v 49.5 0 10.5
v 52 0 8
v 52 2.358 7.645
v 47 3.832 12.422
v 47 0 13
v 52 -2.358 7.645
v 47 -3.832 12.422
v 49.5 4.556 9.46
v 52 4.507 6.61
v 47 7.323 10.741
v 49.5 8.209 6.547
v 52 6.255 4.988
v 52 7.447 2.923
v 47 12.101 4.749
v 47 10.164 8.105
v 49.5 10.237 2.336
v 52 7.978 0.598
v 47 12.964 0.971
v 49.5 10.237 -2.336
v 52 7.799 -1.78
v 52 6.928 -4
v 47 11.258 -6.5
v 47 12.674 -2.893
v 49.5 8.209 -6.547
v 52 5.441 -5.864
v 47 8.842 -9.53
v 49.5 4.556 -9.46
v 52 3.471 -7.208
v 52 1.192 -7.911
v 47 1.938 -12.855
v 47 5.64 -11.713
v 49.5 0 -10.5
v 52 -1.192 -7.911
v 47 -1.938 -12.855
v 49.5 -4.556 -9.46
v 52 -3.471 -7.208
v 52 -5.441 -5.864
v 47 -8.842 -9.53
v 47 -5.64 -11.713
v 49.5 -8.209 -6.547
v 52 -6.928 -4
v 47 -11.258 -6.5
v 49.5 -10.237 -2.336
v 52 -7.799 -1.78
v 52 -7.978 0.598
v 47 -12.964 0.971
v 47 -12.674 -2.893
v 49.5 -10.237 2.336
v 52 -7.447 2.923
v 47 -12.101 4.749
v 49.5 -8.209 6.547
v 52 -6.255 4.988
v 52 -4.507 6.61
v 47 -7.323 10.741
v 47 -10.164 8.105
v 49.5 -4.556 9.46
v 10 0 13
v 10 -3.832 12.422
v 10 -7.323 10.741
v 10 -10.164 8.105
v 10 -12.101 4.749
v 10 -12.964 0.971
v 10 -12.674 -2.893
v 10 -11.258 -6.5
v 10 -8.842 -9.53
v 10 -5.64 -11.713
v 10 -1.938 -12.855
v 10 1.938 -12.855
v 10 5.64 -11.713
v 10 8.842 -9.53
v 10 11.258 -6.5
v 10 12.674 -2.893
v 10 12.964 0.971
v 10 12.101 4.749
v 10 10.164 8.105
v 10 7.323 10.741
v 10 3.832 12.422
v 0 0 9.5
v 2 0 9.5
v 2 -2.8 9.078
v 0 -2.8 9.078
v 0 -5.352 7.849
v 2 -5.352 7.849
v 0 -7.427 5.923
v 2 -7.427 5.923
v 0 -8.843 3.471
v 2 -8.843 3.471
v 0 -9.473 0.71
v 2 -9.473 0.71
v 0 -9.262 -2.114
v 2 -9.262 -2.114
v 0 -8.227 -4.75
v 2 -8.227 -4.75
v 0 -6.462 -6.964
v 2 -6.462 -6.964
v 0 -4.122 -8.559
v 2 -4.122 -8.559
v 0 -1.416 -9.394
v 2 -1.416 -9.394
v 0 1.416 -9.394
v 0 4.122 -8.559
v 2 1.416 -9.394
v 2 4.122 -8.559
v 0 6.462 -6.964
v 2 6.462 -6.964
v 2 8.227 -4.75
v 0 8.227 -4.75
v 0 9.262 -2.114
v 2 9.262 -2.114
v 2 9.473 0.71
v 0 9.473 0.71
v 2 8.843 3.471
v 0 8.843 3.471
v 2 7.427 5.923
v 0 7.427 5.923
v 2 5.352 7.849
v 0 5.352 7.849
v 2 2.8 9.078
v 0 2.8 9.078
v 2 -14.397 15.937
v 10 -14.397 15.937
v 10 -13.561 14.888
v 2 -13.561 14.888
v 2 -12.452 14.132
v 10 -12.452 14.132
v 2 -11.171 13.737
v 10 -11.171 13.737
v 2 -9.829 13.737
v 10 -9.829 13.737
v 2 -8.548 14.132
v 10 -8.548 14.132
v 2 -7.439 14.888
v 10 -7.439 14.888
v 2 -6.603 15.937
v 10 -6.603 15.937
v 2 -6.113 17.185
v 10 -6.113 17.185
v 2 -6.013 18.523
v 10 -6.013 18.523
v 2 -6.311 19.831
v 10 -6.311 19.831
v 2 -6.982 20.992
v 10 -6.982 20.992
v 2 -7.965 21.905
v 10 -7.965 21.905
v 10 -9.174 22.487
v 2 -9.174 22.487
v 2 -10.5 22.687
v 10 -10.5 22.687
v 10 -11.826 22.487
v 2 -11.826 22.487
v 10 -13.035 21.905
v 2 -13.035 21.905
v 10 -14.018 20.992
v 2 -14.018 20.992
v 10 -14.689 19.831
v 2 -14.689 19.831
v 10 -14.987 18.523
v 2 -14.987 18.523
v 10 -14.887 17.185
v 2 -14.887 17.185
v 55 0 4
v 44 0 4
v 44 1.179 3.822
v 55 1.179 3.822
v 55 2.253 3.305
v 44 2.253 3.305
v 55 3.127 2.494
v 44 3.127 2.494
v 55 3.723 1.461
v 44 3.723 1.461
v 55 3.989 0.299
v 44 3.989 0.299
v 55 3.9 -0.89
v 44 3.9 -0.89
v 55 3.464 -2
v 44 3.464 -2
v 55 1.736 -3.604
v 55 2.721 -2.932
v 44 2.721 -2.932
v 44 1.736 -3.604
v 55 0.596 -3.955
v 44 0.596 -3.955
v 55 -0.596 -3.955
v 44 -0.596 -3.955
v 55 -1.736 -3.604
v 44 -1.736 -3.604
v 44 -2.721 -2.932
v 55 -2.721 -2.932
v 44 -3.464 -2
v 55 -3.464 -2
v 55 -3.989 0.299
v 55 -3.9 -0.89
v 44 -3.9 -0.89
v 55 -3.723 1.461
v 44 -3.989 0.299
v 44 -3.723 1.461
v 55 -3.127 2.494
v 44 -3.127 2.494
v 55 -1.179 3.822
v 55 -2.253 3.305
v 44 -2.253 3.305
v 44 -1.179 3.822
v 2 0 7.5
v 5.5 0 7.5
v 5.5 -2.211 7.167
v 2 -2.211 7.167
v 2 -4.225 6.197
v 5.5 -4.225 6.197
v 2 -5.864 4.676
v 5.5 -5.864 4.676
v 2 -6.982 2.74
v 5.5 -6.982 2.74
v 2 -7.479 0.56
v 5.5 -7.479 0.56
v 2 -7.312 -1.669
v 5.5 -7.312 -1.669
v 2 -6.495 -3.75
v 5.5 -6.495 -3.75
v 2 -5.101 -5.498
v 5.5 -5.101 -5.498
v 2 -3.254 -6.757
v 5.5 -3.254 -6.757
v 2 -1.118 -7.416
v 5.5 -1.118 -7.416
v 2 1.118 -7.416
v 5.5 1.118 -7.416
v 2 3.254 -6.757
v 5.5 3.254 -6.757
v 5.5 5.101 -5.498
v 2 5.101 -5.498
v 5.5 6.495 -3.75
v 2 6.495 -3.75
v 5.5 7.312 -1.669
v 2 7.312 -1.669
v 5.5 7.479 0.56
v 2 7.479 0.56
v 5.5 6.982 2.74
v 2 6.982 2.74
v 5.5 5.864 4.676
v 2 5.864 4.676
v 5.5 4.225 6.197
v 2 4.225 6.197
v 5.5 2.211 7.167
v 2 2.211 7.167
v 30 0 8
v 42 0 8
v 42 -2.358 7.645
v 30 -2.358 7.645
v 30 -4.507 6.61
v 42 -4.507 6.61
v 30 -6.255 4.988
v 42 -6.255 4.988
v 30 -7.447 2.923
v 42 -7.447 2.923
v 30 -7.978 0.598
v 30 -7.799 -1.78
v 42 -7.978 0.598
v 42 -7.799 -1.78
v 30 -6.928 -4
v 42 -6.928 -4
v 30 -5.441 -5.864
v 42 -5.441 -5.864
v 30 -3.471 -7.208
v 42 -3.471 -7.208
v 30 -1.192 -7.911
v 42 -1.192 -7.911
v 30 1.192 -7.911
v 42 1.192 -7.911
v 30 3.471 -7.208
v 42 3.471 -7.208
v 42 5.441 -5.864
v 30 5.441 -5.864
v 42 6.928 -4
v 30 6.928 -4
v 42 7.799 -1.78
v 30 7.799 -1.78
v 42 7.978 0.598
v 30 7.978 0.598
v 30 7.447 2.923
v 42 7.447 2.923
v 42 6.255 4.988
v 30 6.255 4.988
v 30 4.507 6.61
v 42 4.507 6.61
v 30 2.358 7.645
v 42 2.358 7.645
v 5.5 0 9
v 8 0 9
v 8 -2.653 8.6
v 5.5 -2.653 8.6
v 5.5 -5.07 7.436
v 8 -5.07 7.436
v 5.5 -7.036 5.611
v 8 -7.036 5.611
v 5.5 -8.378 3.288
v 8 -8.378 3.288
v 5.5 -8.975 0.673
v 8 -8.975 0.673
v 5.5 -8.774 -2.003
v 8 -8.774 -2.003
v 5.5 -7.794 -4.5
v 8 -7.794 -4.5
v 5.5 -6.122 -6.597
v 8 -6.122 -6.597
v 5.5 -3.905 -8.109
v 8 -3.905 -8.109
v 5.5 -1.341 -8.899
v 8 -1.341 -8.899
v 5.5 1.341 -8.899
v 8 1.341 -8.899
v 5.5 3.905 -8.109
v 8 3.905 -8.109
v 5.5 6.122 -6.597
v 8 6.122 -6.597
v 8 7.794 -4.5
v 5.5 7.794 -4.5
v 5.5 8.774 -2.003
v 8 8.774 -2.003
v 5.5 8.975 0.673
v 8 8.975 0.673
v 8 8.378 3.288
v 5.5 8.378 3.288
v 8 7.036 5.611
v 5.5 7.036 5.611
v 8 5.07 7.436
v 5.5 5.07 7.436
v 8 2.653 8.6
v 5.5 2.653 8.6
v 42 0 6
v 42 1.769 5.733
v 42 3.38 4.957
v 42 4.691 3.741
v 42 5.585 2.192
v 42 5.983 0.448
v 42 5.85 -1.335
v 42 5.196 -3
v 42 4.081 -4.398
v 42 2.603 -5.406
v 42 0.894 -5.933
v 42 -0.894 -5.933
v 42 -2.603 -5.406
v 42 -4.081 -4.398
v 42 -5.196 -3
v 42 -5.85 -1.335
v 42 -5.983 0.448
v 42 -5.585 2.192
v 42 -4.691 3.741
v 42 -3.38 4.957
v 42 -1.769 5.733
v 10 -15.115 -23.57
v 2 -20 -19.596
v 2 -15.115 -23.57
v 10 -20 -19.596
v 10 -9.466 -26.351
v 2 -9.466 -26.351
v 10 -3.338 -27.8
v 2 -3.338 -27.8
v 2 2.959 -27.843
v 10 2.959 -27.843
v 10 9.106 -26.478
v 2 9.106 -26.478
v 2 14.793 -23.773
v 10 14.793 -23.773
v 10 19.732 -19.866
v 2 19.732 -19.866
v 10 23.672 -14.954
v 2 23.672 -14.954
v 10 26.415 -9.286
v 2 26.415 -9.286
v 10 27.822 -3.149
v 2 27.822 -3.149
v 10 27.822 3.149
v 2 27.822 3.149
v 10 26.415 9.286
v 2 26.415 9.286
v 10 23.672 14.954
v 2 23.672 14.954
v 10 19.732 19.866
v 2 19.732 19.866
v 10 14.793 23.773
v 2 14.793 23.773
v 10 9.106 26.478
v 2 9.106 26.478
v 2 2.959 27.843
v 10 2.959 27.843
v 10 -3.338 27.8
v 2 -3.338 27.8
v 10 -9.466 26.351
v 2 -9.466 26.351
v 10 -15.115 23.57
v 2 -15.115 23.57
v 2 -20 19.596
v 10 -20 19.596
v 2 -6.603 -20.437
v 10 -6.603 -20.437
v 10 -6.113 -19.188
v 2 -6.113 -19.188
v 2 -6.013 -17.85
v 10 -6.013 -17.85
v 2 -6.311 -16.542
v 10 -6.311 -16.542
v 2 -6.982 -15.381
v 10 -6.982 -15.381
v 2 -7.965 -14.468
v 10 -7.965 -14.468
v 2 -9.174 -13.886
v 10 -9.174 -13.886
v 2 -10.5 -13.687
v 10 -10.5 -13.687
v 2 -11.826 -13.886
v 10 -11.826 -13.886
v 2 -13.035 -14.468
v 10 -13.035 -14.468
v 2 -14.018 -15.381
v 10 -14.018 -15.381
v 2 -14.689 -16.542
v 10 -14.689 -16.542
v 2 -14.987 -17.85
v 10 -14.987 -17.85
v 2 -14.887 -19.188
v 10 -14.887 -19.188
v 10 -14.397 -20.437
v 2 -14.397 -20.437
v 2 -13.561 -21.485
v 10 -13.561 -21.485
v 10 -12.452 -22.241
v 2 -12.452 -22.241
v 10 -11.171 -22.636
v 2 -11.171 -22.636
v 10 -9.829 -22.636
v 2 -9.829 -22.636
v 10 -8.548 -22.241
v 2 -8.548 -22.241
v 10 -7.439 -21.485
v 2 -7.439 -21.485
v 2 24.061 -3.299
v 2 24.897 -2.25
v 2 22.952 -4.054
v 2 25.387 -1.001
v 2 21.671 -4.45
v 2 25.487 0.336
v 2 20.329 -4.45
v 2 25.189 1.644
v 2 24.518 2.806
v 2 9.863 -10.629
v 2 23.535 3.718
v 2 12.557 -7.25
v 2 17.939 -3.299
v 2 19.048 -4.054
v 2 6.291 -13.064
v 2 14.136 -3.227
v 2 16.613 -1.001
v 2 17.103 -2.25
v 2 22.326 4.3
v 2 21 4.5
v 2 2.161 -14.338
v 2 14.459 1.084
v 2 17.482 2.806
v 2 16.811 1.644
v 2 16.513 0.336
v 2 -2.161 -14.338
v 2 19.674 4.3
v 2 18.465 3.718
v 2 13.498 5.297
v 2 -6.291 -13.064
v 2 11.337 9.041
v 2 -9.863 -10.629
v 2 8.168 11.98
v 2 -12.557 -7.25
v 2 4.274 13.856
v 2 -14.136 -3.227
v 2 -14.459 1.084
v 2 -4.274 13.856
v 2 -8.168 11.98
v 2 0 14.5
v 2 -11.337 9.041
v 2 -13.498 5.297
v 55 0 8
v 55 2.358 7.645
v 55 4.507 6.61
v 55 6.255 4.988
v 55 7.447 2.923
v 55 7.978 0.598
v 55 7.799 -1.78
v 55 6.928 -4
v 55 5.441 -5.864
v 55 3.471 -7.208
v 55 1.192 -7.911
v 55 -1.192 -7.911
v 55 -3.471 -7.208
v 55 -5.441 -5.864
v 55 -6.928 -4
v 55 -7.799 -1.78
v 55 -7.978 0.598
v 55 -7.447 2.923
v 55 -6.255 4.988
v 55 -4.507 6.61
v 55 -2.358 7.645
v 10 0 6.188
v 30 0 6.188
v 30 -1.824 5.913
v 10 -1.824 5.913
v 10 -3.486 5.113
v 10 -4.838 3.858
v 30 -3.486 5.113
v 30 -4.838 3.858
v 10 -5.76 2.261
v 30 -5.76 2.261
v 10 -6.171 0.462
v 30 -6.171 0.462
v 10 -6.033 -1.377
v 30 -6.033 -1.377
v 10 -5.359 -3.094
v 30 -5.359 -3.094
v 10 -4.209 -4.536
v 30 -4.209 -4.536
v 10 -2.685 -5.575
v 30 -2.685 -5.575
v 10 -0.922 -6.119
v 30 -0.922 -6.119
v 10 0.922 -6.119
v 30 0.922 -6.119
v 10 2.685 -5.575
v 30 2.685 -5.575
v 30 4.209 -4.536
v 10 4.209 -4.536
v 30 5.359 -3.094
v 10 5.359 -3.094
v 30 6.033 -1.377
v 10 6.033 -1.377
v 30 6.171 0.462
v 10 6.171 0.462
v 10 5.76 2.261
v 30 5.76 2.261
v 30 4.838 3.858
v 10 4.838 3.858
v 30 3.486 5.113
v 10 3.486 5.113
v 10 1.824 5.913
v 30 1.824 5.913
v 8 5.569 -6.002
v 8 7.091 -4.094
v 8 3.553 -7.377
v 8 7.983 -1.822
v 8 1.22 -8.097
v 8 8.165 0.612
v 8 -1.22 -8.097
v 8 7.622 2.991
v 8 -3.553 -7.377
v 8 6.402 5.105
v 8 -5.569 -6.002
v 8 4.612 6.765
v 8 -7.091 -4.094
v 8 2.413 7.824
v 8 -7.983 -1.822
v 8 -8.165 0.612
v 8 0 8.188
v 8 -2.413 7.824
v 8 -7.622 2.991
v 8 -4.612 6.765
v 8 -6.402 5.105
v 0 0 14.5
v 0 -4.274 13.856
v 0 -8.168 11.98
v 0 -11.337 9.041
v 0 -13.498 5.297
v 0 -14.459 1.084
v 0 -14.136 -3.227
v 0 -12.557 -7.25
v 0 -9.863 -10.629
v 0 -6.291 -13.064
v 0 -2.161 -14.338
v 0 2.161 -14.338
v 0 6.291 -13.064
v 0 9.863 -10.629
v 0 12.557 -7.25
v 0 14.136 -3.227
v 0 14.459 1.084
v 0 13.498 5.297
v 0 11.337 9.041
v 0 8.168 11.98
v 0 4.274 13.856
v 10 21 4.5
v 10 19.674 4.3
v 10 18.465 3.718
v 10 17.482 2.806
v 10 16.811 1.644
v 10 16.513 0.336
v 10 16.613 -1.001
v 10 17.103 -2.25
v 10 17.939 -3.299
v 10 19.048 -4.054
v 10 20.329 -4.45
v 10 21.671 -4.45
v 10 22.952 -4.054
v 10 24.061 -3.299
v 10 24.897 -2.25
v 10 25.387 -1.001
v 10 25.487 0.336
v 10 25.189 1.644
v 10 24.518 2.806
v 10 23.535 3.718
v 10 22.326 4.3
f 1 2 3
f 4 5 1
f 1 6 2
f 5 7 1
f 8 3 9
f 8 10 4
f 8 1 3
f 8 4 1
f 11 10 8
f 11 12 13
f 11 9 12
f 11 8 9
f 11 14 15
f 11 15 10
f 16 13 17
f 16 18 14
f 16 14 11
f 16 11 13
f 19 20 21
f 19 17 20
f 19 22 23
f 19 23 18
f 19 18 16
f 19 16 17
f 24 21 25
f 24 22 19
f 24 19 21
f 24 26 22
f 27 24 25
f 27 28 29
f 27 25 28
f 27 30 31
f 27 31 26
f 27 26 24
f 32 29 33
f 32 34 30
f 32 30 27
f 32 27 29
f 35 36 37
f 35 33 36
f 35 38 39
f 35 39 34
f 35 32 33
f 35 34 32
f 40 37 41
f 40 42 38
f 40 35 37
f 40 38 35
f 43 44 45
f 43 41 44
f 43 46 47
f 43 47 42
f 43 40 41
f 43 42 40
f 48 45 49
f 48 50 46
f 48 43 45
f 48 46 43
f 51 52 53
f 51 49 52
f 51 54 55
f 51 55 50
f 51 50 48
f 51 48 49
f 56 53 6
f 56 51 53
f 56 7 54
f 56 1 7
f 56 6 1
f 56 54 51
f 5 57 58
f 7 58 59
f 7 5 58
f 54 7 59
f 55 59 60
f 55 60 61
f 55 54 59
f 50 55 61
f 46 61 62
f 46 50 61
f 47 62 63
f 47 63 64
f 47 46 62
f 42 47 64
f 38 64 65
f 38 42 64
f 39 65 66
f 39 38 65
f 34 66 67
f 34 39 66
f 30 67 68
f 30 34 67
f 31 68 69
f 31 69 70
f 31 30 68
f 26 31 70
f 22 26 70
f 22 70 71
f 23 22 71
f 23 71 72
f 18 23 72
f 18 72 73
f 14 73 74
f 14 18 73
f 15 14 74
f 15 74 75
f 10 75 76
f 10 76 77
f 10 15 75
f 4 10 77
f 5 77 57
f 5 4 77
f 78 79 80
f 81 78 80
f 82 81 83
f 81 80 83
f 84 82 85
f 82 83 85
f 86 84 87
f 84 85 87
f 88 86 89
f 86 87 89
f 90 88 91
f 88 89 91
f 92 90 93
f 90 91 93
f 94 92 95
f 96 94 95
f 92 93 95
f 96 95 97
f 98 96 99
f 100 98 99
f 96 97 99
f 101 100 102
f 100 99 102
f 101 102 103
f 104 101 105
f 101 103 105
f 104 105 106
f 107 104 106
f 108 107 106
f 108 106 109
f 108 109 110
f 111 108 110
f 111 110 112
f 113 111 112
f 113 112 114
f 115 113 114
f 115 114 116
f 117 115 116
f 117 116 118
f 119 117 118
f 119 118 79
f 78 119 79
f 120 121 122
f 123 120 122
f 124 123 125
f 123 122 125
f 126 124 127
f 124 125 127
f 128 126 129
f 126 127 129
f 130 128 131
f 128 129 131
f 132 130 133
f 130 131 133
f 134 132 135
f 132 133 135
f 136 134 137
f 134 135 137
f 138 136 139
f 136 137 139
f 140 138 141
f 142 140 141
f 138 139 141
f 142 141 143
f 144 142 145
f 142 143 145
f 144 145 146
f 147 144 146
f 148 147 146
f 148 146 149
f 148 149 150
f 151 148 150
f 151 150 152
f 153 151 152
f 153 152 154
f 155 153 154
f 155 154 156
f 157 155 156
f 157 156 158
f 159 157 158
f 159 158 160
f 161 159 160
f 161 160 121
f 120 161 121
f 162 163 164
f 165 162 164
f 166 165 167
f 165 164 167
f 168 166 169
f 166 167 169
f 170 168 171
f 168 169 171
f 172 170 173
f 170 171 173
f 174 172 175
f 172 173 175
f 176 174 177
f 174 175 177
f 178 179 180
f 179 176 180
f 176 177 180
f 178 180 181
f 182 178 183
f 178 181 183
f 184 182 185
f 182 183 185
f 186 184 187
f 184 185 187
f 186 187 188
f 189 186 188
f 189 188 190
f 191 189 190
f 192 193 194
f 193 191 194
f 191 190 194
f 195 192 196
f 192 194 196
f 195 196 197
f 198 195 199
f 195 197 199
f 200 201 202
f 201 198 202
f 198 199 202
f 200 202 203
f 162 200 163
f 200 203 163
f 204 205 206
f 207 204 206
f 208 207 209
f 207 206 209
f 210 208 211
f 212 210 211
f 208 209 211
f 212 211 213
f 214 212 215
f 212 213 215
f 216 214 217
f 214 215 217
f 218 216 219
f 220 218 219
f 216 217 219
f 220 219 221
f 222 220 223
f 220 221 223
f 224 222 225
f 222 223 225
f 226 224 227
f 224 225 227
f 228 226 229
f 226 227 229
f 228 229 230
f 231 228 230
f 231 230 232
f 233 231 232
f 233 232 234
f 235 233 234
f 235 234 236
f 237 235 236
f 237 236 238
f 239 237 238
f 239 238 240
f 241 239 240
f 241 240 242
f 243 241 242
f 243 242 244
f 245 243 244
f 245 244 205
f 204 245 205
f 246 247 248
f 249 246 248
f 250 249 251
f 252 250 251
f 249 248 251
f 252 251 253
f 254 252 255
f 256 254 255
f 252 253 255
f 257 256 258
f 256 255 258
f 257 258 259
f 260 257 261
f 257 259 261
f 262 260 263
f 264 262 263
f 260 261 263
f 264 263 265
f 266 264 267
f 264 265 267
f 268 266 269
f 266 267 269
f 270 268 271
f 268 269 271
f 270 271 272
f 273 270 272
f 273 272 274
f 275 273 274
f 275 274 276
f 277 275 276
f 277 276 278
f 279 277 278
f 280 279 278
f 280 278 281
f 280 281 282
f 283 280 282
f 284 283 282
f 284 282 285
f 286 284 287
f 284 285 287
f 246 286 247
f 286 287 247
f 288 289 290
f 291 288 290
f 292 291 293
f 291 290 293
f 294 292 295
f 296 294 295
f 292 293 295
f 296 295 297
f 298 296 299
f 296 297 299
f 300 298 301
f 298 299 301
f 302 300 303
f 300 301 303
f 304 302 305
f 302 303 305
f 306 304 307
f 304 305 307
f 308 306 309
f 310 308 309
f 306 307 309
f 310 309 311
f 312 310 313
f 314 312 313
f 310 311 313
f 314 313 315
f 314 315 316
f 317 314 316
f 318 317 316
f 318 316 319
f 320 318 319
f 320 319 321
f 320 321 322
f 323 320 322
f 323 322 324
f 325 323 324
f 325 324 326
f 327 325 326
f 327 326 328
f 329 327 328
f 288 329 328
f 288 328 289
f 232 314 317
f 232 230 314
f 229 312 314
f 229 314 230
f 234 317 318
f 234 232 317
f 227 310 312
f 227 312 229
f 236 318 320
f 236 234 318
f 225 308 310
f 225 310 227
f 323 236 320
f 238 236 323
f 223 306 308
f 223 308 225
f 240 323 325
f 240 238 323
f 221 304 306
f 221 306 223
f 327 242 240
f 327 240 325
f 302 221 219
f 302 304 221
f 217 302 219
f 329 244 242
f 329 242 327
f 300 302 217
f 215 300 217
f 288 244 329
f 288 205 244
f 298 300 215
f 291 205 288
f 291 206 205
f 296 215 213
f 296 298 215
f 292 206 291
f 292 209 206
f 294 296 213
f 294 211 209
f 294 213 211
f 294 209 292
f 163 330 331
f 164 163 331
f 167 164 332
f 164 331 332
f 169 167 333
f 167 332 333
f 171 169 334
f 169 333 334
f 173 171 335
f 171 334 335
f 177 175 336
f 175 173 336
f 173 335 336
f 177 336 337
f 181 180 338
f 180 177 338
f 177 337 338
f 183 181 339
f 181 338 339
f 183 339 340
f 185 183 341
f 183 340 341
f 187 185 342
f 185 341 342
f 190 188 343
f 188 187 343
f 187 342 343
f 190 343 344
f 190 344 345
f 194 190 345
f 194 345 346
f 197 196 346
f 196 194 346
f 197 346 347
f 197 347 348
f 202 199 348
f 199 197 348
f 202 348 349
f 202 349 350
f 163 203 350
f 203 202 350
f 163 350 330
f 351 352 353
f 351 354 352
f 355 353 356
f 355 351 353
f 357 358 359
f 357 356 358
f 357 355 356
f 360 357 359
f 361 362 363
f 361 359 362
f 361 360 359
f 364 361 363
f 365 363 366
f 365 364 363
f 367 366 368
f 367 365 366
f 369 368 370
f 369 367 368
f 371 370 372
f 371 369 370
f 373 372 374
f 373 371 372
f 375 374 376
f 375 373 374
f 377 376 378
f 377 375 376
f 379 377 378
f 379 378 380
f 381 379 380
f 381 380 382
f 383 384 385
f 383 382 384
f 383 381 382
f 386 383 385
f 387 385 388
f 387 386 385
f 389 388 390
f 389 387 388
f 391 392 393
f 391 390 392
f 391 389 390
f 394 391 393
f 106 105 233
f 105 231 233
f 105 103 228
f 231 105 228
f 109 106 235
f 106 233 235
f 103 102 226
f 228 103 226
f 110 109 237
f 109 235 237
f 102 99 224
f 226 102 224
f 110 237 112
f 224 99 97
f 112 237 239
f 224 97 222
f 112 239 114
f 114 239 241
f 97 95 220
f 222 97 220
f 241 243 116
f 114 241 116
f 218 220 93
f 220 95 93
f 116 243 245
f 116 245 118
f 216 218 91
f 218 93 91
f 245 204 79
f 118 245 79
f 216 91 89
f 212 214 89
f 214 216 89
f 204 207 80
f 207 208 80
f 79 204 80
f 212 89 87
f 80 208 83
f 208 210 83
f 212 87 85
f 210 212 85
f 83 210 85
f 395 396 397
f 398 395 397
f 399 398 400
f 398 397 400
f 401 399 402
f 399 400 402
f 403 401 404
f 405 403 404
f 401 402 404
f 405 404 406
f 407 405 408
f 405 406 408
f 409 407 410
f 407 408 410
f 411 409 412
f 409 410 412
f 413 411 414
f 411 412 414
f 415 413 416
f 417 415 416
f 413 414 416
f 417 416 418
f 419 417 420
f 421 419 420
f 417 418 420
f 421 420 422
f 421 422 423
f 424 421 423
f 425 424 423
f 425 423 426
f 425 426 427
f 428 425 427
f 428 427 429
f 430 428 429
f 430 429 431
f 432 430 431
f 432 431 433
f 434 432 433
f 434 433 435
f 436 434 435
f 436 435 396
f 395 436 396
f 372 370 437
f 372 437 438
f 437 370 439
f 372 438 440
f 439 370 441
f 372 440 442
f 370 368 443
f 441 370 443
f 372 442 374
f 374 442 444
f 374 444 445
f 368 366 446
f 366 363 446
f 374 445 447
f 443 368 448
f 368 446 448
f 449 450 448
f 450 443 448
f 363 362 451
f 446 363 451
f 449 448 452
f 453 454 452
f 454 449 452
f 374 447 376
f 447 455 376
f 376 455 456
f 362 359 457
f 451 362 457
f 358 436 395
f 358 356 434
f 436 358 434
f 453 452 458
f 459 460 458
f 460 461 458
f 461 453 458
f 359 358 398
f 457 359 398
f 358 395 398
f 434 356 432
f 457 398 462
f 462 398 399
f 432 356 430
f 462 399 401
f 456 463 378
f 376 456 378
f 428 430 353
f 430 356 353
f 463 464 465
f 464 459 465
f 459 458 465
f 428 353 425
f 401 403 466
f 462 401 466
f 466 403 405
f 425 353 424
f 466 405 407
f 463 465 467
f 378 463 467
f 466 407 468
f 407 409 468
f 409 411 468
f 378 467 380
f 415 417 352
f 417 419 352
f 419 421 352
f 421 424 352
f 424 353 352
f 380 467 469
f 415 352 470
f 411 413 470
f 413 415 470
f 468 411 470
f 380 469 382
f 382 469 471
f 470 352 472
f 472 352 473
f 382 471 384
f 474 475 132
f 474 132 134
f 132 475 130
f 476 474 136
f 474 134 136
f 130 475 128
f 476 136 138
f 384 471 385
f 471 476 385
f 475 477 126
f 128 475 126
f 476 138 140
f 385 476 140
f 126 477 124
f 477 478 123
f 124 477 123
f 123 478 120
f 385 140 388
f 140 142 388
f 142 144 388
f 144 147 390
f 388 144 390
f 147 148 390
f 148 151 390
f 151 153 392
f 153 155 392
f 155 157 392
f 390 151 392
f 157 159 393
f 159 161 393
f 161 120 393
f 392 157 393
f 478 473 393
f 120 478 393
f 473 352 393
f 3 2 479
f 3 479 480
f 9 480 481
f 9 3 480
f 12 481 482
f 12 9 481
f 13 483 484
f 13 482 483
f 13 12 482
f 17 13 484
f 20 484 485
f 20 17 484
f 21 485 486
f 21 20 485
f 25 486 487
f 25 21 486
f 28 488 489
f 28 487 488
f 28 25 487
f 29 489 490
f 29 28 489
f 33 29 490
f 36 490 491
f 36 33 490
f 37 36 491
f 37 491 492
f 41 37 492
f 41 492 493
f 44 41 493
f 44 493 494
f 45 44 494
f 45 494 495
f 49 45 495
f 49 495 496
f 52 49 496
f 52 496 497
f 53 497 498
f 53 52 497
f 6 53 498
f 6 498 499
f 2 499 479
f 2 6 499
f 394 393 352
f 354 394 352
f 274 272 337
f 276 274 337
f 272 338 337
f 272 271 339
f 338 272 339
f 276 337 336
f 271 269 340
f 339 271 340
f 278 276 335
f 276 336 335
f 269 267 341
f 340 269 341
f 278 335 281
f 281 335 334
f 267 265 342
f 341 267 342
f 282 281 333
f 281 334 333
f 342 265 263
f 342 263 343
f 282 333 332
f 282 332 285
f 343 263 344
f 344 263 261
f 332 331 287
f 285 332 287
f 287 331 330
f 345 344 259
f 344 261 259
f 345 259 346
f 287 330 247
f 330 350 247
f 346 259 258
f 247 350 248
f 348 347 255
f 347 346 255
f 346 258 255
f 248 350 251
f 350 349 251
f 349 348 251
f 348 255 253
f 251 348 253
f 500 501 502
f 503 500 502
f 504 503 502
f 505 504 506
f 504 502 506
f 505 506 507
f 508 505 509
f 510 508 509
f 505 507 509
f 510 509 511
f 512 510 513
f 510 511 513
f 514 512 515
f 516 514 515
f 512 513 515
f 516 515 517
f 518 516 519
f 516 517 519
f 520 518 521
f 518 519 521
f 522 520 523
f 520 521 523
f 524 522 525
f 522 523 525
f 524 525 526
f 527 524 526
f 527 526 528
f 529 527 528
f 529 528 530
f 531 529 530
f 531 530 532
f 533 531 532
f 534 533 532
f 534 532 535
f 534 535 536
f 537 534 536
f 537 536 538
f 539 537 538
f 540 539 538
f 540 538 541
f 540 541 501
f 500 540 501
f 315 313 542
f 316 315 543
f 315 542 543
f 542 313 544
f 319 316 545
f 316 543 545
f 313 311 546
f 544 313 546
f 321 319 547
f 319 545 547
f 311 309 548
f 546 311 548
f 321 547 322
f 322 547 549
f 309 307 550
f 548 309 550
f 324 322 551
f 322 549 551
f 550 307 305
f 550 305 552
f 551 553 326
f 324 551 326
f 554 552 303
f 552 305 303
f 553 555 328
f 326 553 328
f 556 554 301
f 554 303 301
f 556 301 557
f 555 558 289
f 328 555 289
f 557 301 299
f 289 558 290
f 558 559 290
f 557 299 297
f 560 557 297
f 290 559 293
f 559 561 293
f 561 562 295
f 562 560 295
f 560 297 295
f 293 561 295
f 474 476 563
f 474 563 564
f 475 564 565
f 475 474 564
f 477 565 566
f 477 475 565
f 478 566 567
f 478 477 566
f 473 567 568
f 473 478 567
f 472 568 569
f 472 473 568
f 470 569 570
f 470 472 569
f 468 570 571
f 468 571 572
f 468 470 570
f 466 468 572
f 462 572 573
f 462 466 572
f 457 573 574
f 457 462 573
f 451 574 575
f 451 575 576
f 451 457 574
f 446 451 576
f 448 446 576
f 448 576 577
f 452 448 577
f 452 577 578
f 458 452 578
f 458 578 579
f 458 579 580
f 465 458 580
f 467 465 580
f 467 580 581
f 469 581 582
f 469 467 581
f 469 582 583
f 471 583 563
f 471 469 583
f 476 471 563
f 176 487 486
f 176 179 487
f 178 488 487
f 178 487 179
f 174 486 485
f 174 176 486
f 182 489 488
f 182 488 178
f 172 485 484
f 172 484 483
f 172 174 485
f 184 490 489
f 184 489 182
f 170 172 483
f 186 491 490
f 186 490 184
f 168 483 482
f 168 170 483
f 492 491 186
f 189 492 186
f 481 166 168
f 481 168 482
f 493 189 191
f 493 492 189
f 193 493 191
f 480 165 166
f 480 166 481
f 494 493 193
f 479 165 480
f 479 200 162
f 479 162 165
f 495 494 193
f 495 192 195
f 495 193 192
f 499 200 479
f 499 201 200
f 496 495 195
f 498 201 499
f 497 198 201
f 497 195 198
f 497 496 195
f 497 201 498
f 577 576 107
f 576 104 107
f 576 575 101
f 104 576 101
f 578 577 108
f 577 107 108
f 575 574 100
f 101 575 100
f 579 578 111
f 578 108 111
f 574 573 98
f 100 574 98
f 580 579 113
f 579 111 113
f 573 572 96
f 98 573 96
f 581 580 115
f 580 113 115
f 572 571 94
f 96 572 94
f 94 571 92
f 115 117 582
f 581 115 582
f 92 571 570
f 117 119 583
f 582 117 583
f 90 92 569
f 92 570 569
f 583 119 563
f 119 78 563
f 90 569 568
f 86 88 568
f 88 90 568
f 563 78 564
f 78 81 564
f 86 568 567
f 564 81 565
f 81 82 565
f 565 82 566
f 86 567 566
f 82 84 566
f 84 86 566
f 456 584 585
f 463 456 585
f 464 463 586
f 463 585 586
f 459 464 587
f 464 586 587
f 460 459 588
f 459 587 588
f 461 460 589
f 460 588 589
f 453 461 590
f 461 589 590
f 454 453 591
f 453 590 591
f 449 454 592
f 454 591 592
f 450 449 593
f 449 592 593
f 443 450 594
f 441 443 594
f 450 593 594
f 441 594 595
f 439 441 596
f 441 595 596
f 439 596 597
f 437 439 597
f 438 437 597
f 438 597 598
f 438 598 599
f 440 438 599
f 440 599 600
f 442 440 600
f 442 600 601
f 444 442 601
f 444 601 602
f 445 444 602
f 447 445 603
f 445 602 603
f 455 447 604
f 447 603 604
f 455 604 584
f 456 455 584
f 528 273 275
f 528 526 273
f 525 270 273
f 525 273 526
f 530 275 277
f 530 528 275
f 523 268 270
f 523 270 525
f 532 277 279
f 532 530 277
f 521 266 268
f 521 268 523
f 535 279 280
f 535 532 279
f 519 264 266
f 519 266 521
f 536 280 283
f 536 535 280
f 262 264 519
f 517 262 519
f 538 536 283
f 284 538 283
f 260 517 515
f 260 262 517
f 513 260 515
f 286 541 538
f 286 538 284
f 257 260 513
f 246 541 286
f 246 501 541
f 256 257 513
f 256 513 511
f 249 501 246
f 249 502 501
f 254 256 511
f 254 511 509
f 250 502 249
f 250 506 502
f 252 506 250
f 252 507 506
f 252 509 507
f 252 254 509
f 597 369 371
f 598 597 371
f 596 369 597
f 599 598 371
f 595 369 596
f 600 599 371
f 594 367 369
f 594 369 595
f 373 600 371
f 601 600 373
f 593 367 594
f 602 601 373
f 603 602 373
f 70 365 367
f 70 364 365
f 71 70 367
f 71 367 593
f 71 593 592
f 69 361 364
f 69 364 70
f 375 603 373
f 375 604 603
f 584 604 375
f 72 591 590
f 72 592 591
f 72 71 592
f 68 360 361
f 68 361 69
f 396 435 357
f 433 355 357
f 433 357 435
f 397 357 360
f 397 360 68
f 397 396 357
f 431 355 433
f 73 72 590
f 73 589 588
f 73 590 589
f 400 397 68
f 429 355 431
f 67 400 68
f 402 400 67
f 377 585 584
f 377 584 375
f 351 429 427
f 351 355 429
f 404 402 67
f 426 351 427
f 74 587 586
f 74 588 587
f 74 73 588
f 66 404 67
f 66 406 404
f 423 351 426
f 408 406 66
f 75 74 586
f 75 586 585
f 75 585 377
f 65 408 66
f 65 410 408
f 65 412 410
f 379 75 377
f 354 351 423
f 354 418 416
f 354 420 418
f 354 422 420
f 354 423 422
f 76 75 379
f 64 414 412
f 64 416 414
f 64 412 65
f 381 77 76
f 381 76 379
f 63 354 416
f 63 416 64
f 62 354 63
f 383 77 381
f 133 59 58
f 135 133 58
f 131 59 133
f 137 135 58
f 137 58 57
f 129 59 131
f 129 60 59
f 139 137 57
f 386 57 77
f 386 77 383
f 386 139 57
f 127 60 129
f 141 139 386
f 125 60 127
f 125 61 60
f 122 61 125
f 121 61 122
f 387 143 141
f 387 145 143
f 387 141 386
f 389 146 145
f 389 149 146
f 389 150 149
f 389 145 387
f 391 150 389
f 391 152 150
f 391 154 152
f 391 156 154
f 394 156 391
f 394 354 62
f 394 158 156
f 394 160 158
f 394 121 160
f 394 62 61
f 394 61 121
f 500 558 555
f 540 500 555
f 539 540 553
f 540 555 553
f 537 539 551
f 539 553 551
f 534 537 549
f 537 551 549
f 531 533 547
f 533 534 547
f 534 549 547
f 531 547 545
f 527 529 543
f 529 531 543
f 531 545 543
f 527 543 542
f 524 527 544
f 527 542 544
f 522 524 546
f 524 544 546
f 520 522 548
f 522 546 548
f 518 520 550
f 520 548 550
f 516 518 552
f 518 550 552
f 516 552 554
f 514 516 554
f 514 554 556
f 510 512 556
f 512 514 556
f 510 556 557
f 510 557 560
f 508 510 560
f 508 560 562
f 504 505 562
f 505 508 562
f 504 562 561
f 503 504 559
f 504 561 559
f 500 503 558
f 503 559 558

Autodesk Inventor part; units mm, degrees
ref_plane "YZ Plane" through (0, 0, 0) normal (1, 0, 0) x (0, 1, 0)
ref_plane "XZ Plane" through (0, 0, 0) normal (0, 1, 0) x (-1, 0, 0)
ref_plane "XY Plane" through (0, 0, 0) normal (0, 0, 1) x (1, 0, 0)
sketch "Эскиз1" plane through (0, 0, 0) normal (0, 1, 0) x (-1, 0, 0)
  line L0 (0, 9.5) -> (0, 14.5)
  line L1 (0, 14.5) -> (-2, 14.5)
  line L2 (-2, 14.5) -> (-2, 28)
  line L3 (-55, 4) -> (-55, 8)
  line L4 (-55, 8) -> (-52, 8)
  line L5 (-10, 28) -> (-10, 13)
  line L6 (-10, 13) -> (-47, 13)
  line L7 (-2, 14.5) -> (-2, 28)
  line L8 (-2, 28) -> (-10, 28)
  line L9 (-52, 8) -> (-47.3096, 12.6904)
  line L10 (-47.3096, 12.6904) -> (-47, 13)
  line L11 (0, 0) -> (0, 9.5)
  line L12 (0, 9.5) -> (-2, 9.5)
  line L13 (-2, 7.5) -> (-2, 9.5)
  line L14 (-2, 7.5) -> (-5.5, 7.5)
  line L15 (-5.5, 7.5) -> (-5.5, 9)
  line L16 (-5.5, 9) -> (-8, 9)
  line L17 (0, 0) -> (0, 7)
  line L18 (-8, 9) -> (-8, 0)
  line L19 (-30, 0) -> (-30, 8)
  line L20 (-30, 8) -> (-42, 8)
  line L21 (-42, 8) -> (-42, 6)
  line L22 (-55, 4) -> (-44, 4)
  line L23 (-42, 6) -> (-44, 4)
  line L24 (0, 0) -> (-55, 0)
  line L25 (-8, 0) -> (-30, 0)
  point P0 (-42, 4)
  dimension "d26" = 30
  dimension "d27" = 12
  dimension "d28" = 2
  dimension "d29" = 2
  dimension "d30" = 55
  dimension "d31" = 8
  dimension "d32" = 16
  dimension "d33" = 26
  dimension "d34" = 16
  dimension "d35" = 12
  dimension "d36" = 42
  dimension "d37" = 18
  dimension "d38" = 8
  dimension "d39" = 2.5
  dimension "d40" = 29
  dimension "d41" = 19
  dimension "d42" = 15
  dimension "d43" = 2
  dimension "d44" = 55
  dimension "d45" = 3
  dimension "d46" = 135
  dimension "d47" = 45
  dimension "d48" = 56
  dimension "d49" = 2
revolve "Вращение1" add sketch "Эскиз1" angle 360 about axis through (0, 0, 0) along (1, 0, 0) contours L12 L13 L14 L15 L16 L18 L24 L19 L20 L21 L23 L22 L3 L4 L9 L10 L6 L5 L8 L2 L1 L0
sketch "Эскиз3" plane through (8, 0, 0) normal (-1, 0, 0) x (0, 0, 1)
  point P0 (0, 0)
  point P1 (0, 0)
hole "Отверстие2" at (8, 0, 0) direction (1, 0, 0) diameter 12.376 depth 30 thread size "M14x1.5" class "6H" standard "ISO Metric profile"
sketch "Эскиз4" plane through (2, 0, 0) normal (-1, 0, 0) x (0, 0, 1)
  circle A0 centre (0, 0) radius 21
  point P0 (0, 21)
  dimension "d65" = 42
chamfer "Фаска1" distance 2 angle 45 1 edges at (8, 0, -6.188)
sketch "Эскиз5" plane through (2, 0, 0) normal (-1, 0, 0) x (0, 0, 1)
  point P0 (0, 0)
hole "Отверстие4" at (2, 21, 0) direction (1, 0, 0) diameter 9 depth 30
pattern_circular "Круговой массив2" count 3 over 360 about axis through (1, 0, 0) along (-1, 0, 0) of "Отверстие4"
sketch "Эскиз6" plane through (2, 0, 0) normal (-1, 0, 0) x (0, 0, 1)
  circle A0 centre (0, 0) radius 28 projected
  line L0 (55.1219, -20) -> (-57.0995, -20)
  line L1 (55.1219, -20) -> (-57.0995, -20)
  line L2 (-57.0995, -20) -> (-57.0995, -35.8887)
  line L3 (-57.0995, -35.8887) -> (55.1219, -35.8887)
  line L4 (55.1219, -35.8887) -> (55.1219, -20)
  point P0 (0, 28)
  point P1 (19.5959, -20)
  point P2 (-19.5959, -20)
  dimension "d91" = 48
extrude "Выдавливание1" cut sketch "Эскиз6" against normal blind 10 contours L0 A0 picked at (4.9079, -21.2721)
equation "\"d29\" = d28"
